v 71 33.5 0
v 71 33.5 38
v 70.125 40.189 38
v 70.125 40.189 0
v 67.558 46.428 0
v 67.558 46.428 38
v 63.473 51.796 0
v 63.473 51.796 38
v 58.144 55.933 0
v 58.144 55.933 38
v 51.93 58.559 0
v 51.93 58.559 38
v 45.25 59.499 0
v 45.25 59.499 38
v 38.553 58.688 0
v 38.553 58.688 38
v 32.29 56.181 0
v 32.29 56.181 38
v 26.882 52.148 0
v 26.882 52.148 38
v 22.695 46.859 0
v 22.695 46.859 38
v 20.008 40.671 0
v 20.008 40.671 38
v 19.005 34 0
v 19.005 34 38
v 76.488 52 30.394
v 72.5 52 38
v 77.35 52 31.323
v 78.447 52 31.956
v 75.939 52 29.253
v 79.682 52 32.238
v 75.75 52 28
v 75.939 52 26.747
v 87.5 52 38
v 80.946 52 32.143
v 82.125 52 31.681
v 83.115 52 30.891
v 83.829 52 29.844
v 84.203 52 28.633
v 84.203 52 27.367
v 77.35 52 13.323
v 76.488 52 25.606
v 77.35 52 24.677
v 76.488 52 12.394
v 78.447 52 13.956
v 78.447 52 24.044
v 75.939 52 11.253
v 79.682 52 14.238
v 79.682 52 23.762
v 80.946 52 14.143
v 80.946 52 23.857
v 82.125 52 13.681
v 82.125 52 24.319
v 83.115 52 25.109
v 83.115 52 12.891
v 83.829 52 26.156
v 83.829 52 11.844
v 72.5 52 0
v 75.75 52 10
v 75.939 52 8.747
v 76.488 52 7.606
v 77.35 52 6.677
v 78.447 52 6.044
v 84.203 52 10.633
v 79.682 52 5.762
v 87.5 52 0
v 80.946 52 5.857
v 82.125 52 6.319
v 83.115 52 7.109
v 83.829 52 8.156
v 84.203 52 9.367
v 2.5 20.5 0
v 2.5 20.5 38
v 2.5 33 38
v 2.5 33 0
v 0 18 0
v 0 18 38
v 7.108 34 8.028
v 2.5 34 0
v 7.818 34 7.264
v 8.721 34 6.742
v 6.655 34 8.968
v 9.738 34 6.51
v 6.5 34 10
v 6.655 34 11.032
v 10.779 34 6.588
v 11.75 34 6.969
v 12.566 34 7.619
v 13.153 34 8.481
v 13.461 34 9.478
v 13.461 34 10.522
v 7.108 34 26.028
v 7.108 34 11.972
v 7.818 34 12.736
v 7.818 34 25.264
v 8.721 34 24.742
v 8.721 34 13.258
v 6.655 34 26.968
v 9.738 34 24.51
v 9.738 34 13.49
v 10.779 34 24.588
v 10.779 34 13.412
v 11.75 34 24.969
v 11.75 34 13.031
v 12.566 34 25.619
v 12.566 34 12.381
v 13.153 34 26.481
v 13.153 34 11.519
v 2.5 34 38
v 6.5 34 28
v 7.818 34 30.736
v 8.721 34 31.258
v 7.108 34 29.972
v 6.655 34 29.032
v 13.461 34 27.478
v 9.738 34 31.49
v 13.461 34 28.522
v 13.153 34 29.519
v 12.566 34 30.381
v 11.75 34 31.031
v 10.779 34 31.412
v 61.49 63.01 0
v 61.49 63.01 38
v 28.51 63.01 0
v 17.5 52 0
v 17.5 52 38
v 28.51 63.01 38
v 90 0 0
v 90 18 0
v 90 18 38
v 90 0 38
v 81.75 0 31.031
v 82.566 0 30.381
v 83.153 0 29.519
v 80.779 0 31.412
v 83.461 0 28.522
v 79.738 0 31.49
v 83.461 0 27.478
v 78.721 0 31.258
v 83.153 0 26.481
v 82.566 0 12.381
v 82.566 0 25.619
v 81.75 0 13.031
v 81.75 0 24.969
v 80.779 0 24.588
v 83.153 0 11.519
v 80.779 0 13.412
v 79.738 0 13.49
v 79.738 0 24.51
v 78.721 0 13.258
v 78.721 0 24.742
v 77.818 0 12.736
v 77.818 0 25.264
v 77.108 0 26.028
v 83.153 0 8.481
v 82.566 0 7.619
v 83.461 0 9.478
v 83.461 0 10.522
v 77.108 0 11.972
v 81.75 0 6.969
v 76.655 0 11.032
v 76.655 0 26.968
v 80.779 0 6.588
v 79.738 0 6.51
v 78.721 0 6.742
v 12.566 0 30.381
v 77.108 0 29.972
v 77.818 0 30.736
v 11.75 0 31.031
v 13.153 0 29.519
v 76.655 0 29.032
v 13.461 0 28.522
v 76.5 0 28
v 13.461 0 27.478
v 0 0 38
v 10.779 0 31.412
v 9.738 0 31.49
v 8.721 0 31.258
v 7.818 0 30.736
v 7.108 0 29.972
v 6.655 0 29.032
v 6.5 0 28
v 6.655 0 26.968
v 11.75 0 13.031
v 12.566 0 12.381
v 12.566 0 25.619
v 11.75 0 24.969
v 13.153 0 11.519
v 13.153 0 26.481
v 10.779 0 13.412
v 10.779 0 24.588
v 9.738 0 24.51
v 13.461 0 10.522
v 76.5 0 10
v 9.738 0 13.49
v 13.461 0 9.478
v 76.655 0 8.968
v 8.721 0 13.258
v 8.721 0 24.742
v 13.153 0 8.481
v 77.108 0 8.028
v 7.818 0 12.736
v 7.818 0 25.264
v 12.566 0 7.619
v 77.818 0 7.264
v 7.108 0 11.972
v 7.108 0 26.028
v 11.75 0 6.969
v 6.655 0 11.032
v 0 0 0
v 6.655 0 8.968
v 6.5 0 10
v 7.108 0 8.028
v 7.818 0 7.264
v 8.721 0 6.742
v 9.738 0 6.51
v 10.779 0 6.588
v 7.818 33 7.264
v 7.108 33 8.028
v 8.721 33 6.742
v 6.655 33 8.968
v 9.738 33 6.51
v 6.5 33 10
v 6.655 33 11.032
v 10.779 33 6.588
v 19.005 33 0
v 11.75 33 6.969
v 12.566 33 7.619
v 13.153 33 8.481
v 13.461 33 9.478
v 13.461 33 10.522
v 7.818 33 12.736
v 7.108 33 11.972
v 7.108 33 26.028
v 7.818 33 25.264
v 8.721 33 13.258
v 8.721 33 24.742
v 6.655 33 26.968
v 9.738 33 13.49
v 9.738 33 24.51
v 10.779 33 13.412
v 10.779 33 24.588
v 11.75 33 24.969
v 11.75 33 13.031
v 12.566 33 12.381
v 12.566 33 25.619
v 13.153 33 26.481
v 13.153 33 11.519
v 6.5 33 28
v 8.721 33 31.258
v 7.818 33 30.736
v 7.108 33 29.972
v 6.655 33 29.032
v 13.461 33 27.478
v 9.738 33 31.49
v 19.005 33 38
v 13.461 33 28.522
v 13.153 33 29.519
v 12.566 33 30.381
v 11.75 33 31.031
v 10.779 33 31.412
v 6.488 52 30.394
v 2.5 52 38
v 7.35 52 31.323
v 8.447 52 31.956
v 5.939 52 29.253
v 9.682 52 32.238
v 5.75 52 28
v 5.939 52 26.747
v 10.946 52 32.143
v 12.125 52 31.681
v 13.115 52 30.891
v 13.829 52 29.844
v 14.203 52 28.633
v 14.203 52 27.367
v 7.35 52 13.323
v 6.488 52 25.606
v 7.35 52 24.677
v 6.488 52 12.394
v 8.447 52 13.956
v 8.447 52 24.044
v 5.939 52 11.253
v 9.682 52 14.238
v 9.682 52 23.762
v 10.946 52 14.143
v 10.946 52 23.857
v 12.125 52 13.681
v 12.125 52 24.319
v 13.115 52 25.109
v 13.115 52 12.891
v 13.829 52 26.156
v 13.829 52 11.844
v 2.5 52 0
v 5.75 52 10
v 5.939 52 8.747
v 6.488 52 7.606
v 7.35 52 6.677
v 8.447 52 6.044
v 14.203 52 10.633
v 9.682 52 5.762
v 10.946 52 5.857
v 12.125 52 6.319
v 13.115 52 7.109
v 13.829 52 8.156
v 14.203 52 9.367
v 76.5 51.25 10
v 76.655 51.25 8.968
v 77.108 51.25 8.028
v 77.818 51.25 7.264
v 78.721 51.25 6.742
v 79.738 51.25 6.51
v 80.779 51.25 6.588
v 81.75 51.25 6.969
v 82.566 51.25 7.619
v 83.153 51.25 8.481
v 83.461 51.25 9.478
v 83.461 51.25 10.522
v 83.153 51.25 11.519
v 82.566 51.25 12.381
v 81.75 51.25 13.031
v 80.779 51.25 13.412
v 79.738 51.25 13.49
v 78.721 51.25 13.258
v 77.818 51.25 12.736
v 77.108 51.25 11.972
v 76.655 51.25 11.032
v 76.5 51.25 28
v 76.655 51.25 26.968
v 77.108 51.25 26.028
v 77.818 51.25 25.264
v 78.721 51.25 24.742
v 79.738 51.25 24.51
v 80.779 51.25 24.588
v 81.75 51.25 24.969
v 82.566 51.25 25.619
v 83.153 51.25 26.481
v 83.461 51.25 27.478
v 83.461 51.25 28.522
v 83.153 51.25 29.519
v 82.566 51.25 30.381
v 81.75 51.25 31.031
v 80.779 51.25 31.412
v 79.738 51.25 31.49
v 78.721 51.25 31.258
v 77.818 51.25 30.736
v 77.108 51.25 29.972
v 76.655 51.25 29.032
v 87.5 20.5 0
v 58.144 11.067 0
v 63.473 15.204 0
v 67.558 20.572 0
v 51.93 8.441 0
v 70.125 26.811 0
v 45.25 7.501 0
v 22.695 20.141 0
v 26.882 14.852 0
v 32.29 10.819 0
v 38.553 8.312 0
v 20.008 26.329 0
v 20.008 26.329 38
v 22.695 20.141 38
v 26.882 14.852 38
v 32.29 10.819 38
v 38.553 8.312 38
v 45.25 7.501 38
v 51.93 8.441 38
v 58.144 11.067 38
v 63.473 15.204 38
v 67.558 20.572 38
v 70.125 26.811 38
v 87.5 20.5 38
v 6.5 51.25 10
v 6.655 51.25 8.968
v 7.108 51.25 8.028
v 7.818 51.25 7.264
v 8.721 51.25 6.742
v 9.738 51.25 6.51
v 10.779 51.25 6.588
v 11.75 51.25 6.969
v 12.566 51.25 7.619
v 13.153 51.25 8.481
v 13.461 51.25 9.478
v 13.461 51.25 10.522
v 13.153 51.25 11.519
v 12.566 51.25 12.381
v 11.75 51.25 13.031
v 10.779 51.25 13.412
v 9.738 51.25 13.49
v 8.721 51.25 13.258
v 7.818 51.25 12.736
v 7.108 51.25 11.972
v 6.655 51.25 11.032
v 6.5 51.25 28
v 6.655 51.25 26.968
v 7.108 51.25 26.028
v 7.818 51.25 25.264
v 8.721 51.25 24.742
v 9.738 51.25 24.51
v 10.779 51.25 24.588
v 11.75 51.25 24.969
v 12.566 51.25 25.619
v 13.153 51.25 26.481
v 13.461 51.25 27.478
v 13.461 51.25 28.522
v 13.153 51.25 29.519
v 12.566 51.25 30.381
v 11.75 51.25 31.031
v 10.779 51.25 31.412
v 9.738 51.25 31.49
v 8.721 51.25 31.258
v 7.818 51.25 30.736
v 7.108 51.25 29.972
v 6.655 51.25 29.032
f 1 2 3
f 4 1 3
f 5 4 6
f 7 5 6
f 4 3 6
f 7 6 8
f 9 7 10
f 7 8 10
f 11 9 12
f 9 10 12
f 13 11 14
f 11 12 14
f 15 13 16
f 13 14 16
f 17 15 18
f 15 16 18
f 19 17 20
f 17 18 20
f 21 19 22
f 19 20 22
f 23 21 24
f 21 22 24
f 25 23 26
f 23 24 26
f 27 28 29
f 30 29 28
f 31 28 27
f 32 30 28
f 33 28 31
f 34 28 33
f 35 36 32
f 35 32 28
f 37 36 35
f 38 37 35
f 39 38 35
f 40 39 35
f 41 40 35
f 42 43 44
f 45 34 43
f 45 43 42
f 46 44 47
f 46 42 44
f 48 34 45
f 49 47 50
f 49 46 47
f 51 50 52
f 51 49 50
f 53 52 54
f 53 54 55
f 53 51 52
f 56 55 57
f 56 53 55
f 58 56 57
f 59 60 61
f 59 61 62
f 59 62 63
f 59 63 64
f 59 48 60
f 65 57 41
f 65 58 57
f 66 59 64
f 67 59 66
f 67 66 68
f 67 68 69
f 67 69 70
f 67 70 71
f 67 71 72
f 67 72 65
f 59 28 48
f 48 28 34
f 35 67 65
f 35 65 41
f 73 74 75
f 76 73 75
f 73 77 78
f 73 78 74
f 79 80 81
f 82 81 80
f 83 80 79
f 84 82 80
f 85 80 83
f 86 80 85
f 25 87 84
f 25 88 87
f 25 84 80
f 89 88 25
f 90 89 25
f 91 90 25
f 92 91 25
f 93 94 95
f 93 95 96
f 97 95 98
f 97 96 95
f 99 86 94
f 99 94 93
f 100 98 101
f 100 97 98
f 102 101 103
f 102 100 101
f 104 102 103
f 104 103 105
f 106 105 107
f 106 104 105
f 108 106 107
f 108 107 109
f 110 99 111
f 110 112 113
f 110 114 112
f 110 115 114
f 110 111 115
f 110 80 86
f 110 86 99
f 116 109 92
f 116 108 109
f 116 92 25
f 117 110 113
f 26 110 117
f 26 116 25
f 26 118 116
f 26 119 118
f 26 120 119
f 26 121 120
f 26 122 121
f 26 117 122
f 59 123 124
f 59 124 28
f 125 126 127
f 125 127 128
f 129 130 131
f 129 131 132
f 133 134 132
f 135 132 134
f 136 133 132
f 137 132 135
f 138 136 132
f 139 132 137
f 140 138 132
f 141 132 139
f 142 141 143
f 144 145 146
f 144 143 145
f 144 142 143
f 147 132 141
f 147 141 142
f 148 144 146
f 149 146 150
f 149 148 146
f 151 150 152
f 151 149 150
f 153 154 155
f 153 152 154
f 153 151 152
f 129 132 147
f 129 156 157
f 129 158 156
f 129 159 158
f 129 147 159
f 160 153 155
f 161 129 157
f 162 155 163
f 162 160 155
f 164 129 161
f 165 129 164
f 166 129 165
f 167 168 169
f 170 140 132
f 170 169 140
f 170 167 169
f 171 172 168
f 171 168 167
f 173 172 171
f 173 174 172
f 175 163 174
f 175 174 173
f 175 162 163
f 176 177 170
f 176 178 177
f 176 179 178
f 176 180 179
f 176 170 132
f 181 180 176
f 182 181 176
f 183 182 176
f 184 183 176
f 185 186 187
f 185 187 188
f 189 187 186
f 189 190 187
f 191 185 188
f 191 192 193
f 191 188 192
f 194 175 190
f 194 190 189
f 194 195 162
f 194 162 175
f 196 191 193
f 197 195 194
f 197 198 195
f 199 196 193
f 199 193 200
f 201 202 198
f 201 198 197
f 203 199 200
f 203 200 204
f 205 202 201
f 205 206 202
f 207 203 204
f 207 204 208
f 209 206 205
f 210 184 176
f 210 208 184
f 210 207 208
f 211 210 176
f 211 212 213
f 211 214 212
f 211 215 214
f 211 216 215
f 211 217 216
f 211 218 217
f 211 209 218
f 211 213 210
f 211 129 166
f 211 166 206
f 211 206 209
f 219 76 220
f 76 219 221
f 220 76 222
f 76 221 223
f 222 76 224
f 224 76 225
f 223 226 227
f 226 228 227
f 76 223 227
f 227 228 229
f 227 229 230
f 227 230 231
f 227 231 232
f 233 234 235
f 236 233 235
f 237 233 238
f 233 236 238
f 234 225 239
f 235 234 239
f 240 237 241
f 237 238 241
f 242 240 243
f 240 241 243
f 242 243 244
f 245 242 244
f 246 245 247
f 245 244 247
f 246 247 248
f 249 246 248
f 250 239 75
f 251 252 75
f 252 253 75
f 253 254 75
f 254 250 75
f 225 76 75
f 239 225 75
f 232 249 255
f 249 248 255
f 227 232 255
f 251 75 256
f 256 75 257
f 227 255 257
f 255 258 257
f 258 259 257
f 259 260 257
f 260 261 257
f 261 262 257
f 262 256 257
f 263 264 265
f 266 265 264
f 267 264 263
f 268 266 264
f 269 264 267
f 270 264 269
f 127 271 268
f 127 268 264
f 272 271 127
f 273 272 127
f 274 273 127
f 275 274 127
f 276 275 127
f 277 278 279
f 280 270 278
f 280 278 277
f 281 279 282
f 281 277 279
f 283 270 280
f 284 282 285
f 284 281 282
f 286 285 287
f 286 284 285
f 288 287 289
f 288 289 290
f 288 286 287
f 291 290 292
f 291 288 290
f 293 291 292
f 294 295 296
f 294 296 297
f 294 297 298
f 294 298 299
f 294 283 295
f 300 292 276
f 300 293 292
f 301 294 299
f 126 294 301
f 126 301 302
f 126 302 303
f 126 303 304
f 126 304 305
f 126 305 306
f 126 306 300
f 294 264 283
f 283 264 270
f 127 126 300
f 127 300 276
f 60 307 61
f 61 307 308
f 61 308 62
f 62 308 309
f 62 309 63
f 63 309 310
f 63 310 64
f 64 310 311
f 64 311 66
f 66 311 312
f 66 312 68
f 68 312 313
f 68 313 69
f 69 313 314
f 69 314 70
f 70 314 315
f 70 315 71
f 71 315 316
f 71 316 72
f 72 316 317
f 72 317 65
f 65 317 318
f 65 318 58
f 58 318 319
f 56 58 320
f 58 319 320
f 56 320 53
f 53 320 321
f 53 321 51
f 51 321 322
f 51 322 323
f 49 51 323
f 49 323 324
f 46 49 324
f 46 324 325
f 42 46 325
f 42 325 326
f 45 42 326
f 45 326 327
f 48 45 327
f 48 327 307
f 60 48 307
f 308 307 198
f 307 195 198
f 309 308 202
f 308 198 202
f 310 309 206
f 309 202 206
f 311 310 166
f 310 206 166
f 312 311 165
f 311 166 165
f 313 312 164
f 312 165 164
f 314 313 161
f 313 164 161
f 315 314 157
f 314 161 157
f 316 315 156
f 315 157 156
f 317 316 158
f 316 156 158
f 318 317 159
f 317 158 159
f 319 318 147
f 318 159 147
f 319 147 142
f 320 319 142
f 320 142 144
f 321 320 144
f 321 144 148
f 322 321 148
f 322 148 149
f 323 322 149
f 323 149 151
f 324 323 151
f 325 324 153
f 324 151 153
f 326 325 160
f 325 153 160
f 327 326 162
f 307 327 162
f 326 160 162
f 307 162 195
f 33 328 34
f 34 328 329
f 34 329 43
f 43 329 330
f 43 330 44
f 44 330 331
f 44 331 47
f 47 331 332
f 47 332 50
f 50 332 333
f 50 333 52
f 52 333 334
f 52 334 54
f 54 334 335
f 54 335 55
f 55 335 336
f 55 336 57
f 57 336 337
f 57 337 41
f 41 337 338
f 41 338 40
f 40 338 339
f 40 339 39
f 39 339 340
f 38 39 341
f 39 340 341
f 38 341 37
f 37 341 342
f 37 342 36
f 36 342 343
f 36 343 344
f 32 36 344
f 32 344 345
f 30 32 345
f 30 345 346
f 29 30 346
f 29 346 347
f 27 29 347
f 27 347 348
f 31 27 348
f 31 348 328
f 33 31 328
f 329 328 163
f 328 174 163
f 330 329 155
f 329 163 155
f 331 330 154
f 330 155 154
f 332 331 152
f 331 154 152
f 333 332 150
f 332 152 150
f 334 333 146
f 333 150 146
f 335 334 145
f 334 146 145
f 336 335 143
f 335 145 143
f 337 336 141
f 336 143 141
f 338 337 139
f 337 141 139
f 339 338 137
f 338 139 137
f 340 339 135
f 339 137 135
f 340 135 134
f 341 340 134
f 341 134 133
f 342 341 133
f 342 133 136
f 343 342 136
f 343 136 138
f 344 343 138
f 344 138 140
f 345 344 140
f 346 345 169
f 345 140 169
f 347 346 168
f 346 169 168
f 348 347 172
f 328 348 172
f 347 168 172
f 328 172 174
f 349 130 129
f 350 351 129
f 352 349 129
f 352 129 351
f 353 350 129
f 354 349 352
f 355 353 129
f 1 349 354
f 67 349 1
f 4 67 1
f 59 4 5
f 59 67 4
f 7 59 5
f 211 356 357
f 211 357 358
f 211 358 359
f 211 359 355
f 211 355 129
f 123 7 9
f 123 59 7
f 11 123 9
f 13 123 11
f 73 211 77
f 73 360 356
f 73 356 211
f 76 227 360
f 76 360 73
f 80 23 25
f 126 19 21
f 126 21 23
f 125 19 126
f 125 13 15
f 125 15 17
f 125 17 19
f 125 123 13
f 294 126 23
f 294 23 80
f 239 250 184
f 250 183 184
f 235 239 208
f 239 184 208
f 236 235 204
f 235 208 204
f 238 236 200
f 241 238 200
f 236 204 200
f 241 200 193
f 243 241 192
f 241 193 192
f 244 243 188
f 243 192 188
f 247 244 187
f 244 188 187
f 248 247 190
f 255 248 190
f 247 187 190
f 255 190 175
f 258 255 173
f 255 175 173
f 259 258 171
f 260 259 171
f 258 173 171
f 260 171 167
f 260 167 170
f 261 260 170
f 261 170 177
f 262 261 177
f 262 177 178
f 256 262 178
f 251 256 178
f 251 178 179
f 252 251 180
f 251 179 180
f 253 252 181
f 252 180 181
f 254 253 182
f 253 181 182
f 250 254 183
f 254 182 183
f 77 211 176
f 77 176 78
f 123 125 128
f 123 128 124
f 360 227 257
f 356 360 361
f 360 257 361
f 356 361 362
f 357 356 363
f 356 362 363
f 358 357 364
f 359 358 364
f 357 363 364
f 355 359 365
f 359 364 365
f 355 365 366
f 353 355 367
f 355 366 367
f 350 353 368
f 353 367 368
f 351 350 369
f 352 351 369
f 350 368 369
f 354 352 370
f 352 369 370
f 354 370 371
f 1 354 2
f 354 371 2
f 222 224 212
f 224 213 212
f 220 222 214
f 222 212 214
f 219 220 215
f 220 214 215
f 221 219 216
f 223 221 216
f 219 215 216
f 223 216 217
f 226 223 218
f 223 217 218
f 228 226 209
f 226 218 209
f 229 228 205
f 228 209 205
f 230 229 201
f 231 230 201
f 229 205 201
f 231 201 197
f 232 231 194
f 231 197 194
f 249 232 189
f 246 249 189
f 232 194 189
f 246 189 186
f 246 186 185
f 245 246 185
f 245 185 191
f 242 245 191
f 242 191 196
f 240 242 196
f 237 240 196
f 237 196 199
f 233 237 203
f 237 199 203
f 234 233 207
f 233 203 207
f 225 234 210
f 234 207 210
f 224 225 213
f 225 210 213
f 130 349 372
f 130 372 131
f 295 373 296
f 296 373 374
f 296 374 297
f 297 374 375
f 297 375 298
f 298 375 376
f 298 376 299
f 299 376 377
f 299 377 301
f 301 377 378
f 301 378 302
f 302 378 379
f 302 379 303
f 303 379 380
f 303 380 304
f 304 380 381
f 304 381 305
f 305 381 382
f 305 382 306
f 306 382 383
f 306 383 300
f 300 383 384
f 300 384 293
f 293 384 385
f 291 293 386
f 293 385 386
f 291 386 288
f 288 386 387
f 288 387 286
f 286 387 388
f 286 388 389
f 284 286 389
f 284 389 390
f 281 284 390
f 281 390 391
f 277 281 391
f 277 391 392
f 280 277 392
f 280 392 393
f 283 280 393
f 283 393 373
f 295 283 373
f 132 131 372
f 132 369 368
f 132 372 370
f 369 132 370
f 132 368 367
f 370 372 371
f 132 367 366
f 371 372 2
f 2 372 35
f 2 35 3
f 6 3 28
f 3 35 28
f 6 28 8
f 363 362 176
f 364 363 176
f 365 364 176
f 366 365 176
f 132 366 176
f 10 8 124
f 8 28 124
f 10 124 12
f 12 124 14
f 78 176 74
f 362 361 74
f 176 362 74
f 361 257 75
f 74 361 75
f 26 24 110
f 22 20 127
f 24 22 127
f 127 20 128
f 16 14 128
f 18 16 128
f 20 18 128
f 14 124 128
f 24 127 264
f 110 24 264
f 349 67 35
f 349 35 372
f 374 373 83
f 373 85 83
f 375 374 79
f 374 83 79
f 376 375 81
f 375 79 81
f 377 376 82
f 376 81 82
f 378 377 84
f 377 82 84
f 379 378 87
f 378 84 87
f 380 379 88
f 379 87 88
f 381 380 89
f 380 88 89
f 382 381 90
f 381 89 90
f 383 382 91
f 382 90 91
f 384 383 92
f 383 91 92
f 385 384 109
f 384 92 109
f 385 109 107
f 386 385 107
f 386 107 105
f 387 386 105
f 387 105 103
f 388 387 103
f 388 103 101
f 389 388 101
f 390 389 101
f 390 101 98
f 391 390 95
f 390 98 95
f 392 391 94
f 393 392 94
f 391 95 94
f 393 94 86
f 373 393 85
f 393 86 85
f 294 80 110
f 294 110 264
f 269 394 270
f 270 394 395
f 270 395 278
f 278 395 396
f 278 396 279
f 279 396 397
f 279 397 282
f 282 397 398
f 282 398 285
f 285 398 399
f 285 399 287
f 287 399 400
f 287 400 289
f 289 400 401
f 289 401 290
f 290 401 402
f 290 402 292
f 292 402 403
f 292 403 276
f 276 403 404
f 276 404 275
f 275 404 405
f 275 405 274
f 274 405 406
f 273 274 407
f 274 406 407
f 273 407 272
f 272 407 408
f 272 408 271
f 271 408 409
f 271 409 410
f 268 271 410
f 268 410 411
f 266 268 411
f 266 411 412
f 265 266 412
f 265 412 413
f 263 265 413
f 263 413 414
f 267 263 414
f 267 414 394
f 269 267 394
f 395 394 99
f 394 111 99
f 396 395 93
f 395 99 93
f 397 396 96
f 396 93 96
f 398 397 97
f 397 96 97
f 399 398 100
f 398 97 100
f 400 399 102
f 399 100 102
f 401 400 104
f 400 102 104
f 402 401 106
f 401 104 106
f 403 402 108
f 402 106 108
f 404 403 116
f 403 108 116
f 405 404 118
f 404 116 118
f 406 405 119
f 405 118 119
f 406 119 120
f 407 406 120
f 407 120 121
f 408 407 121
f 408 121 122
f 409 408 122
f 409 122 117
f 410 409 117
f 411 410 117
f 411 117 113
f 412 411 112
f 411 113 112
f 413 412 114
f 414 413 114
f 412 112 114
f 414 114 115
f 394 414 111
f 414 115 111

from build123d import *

# Parameters (mm, degrees)
AUFSATZ_LINEAR_AUSTRAGEN1_DEPTH          = 38
SKIZZE2_R                                = 26
SCHNITT_LINEAR_AUSTRAGEN1_DEPTH          = 38
SKIZZE3_W                                = 17
SKIZZE3_H                                = 1
SCHNITT_LINEAR_AUSTRAGEN2_DEPTH          = 38
F_7_0_7_DURCHMESSER_BOHRUNG4_D           = 7
F_7_0_7_DURCHMESSER_BOHRUNG4_CSINK_D     = 8.5
F_7_0_7_DURCHMESSER_BOHRUNG4_CSINK_ANGLE = 90


with BuildPart() as part:
    # Skizze1 → Aufsatz-Linear austragen1 (new body)
    with BuildSketch(Plane.XY):
        Polygon((0, 0), (0, 18), (2.5, 20.5), (2.5, 52), (17.5, 52), (28.51, 63.01), (61.49, 63.01), (72.5, 52), (87.5, 52), (87.5, 20.5), (90, 18), (90, 0), align=None)
    extrude(amount=AUFSATZ_LINEAR_AUSTRAGEN1_DEPTH)

    # Skizze2 → Schnitt-Linear austragen1 (cut)
    with BuildSketch(Plane.XY.offset(38)):
        with Locations((45, 33.5)):
            Circle(SKIZZE2_R)
    extrude(amount=-SCHNITT_LINEAR_AUSTRAGEN1_DEPTH, mode=Mode.SUBTRACT)

    # Skizze3 → Schnitt-Linear austragen2 (cut)
    with BuildSketch(Plane.XY.offset(38)):
        with Locations((11, 33.5)):
            Rectangle(SKIZZE3_W, SKIZZE3_H)
    extrude(amount=-SCHNITT_LINEAR_AUSTRAGEN2_DEPTH, mode=Mode.SUBTRACT)

    # Ø7.0 (7) Durchmesser Bohrung4 (through all)
    with Locations(Plane(origin=(0, 52, 0), x_dir=(1, 0, 0), z_dir=(0, 1, 0))):
        with Locations((10, -10), (10, -28), (80, -28), (80, -10)):
            CounterSinkHole(F_7_0_7_DURCHMESSER_BOHRUNG4_D / 2, F_7_0_7_DURCHMESSER_BOHRUNG4_CSINK_D / 2, counter_sink_angle=F_7_0_7_DURCHMESSER_BOHRUNG4_CSINK_ANGLE)


solid = part.part
